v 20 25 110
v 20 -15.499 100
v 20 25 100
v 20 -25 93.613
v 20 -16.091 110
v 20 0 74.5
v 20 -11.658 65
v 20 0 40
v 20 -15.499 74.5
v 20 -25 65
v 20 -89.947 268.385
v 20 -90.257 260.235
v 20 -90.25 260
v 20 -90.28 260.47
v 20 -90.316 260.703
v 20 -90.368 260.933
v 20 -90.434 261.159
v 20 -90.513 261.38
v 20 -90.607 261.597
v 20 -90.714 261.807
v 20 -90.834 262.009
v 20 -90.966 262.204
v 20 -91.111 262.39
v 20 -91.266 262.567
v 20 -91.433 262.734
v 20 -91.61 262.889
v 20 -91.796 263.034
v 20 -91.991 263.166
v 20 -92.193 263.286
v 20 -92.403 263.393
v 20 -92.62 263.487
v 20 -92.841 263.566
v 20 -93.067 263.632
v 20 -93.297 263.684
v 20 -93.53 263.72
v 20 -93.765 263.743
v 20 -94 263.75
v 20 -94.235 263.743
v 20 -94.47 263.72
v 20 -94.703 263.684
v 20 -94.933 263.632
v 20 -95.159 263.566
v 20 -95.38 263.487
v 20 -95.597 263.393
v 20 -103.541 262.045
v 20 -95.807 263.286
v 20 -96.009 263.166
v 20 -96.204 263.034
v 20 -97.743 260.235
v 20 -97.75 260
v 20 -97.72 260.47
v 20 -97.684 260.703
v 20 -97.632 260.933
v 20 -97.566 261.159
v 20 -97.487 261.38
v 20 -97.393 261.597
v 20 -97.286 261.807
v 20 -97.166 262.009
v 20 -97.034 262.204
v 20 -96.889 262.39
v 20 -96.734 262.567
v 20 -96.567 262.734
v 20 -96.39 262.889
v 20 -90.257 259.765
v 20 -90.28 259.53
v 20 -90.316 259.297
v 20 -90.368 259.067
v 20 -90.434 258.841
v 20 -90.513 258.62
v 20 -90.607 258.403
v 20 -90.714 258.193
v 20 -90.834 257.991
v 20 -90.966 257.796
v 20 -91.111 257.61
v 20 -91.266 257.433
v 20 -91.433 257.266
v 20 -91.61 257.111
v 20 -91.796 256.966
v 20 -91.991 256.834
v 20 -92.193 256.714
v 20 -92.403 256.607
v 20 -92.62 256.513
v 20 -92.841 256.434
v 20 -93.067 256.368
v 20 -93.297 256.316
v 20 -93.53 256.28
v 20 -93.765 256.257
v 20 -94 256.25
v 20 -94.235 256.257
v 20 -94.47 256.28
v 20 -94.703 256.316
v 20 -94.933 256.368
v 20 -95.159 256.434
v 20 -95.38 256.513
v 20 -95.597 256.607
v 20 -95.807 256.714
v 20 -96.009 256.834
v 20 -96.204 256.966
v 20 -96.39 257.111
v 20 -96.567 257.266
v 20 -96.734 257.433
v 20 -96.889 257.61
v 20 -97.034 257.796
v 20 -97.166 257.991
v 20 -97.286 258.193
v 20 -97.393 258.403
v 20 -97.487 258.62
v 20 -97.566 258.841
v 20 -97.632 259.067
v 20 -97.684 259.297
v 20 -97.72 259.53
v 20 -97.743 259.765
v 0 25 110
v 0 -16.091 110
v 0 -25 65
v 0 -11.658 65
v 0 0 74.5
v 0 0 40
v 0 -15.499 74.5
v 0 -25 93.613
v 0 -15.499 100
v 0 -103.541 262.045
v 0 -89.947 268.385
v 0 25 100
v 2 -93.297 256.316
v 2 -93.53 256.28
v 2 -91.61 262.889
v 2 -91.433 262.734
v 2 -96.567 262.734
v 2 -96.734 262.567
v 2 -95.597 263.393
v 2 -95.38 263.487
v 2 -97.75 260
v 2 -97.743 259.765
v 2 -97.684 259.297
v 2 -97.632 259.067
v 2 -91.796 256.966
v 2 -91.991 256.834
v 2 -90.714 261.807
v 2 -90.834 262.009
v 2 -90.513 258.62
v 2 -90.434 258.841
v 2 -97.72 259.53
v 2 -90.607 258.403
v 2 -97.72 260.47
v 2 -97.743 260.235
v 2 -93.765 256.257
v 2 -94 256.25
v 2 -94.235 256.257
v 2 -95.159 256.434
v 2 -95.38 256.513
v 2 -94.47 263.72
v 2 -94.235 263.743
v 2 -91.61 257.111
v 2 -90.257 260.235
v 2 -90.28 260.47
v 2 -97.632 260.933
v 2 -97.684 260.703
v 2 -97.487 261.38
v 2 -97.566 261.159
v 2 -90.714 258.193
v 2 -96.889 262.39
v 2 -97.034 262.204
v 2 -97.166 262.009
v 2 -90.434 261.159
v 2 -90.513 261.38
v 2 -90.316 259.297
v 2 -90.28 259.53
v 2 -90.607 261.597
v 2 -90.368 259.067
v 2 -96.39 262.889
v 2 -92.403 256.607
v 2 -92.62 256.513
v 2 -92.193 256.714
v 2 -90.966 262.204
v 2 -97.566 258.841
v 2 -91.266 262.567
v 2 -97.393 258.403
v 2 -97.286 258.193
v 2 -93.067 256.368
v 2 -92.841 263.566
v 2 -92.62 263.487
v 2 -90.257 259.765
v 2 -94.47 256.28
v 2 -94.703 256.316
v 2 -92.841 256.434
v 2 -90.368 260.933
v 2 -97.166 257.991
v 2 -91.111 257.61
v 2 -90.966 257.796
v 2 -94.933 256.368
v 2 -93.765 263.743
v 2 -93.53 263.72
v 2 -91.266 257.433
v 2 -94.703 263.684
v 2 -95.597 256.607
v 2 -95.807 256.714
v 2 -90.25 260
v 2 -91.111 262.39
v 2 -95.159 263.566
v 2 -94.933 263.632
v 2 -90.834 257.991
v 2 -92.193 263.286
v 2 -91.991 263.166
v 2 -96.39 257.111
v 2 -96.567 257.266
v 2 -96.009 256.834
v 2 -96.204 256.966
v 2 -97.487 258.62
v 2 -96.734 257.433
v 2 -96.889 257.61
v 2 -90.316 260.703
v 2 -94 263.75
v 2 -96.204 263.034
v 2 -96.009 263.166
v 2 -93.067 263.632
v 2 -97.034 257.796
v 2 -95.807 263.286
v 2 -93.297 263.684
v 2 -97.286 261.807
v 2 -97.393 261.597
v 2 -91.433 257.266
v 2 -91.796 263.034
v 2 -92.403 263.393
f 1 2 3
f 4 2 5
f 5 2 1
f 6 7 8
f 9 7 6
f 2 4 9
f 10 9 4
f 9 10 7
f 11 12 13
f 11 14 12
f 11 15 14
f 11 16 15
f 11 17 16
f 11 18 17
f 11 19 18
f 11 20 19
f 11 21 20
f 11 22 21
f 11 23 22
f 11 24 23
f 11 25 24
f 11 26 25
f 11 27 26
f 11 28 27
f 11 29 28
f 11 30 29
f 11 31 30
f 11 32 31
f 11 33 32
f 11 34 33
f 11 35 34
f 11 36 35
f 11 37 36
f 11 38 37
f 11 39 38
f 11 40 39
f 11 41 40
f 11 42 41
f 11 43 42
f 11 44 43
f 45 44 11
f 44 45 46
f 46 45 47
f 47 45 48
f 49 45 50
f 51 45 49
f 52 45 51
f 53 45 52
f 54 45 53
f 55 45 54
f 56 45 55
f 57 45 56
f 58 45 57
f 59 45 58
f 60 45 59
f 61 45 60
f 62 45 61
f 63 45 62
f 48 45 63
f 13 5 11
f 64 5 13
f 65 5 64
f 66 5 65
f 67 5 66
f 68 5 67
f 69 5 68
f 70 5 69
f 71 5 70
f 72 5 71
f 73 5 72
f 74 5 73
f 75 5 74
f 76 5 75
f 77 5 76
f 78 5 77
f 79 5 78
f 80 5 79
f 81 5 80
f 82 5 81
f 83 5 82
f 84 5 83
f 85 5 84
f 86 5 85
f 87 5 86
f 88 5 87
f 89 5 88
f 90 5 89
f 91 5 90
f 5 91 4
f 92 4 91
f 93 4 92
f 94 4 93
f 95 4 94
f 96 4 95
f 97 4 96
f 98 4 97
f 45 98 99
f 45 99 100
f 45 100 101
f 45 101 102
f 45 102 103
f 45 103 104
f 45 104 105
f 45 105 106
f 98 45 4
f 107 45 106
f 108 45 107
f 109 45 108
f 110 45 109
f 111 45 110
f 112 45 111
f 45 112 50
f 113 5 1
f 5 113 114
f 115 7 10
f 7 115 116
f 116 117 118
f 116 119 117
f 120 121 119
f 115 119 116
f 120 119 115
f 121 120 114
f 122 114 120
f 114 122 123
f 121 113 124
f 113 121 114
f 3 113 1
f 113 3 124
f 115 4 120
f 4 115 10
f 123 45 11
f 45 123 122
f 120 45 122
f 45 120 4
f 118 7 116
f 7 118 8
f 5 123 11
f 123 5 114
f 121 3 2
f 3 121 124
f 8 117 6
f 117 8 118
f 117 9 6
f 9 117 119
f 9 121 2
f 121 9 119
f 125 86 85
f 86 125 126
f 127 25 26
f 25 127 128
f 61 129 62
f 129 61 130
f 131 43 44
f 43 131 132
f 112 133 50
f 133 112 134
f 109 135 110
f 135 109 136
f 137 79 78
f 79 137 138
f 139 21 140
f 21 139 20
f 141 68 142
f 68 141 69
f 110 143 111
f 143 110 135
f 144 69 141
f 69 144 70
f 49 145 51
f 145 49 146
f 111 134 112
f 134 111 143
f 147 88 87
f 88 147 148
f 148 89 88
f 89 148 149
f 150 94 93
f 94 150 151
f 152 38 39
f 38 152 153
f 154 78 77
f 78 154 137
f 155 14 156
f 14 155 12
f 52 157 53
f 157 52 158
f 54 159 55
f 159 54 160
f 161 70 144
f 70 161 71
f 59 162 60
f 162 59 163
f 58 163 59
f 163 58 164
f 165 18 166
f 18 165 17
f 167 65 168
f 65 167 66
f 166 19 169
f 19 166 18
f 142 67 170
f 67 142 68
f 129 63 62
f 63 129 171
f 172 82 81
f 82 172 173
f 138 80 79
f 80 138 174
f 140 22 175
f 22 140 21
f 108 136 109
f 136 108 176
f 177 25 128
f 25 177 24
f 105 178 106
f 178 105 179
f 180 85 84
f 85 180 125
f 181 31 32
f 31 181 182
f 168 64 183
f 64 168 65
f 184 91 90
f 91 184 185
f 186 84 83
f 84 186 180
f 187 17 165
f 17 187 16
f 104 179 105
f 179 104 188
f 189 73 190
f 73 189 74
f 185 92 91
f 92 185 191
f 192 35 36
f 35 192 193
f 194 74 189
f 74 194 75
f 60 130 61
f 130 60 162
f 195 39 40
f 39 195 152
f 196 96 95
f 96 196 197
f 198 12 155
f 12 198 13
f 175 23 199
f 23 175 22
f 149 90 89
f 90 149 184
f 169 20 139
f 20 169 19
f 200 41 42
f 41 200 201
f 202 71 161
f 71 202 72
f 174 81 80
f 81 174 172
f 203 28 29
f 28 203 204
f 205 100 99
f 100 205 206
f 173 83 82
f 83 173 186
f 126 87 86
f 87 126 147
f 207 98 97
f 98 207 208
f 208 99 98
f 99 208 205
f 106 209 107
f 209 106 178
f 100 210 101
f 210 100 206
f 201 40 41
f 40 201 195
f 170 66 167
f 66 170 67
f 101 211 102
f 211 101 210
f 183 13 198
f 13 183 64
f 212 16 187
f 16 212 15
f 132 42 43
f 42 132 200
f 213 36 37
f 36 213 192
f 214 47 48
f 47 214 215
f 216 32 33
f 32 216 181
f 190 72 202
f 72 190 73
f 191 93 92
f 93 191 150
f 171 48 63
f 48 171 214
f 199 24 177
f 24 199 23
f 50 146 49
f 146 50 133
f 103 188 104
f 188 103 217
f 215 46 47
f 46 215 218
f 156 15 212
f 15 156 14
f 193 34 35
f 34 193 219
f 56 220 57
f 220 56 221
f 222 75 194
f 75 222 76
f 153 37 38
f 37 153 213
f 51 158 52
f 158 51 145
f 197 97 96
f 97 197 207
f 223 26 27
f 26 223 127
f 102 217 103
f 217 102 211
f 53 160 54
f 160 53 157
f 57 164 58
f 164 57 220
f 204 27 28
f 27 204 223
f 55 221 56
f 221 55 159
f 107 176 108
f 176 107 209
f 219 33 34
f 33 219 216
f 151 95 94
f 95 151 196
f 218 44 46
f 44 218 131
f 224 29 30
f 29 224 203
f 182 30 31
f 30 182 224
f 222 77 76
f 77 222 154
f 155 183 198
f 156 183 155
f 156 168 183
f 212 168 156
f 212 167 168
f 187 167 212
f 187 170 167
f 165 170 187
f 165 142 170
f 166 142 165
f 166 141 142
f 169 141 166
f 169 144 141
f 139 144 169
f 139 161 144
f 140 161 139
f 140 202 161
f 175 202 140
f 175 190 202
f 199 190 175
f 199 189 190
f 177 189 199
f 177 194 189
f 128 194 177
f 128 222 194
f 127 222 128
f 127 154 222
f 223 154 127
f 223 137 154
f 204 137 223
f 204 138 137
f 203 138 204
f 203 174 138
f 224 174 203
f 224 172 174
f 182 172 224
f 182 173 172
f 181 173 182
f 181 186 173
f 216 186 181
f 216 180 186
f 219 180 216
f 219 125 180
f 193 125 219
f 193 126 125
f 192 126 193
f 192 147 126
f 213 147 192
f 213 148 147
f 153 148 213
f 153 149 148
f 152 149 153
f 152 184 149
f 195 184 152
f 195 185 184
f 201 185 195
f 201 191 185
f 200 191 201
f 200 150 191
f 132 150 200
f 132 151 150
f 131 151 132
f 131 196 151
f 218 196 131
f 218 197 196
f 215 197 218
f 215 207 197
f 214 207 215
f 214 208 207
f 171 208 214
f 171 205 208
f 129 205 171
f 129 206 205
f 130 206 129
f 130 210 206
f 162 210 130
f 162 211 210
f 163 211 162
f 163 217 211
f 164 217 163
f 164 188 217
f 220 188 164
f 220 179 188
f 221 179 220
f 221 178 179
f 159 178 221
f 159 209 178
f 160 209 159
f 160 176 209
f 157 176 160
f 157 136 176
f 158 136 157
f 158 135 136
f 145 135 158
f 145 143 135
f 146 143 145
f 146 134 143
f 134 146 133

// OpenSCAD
//
// ktRACK50
//
 
gap1 = 0.001;
gap2 = 0.002;
th = 5;


RS = 65+2;


bar();





module bar()
{
difference()
{
    union()
    {
        translate([0, -25, 100-40+5]) cube([20, 50, 45]);
        //translate([0, -25, 100-35+5]) rotate([22, 0, 0]) cube([20, 15, 210]);
        
        translate([0, 0, 40]) rotate([25, 0, 0]) cube([20, 15, 245]);
    }
    
    #unit2();
    
    #translate([2, -94, 260]) rotate([0, 90, 0]) cylinder(r=7.5/2, h=30, $fn=100);
    }
}



module base()
{
X = 80;
Y = -50;
Z = -12;
difference()
{
    union()
    {
        translate([X, Y, Z]) cylinder(r=(RS+5)/2, h=30, $fn=100);
        translate([X-(RS+5)/2, Y, Z]) cube([RS+5, 70, 30]);
        translate([X-(RS+5)/2, Y+45, Z]) cube([RS+5, 5, 60]);
    }
    translate([X, Y, Z+30-5+gap1]) cylinder(r=RS/2, h=5, $fn=100);
    
    #unit();
}
}


module unit()
{
difference()
{
    union()
    {
        translate([0, 0, -100]) cube([300, 50, 200]);
        //translate([300/2, -105, 0]) resize(newsize=[300, 115, 30*2]) sphere(r=10, $fn=100);
        translate([300/2, -105-50, 0]) resize(newsize=[300, 115,  10*2]) rotate([-90, 0, 0]) cylinder(r=10/2, h=7, $fn=100);
        translate([300/2, -105, -100]) resize(newsize=[300, 115, 100]) cylinder(r=10/2, h=7, $fn=100);
    }
    
    difference()
    {
        translate([-50, -500, -100]) cube([500, 500, 200]);
        translate([300/2, -105, -250]) resize(newsize=[300, 115, 500]) cylinder(r=10/2, h=7, $fn=100);
    }
}
}


module unit2()
{
difference()
{
    union()
    {
        translate([0, 0, -100]) cube([300, 50, 200]);
        translate([0, -15.5+gap1, 100-25.5]) cube([300, 15.5, 25.5]);
    }
}
}
